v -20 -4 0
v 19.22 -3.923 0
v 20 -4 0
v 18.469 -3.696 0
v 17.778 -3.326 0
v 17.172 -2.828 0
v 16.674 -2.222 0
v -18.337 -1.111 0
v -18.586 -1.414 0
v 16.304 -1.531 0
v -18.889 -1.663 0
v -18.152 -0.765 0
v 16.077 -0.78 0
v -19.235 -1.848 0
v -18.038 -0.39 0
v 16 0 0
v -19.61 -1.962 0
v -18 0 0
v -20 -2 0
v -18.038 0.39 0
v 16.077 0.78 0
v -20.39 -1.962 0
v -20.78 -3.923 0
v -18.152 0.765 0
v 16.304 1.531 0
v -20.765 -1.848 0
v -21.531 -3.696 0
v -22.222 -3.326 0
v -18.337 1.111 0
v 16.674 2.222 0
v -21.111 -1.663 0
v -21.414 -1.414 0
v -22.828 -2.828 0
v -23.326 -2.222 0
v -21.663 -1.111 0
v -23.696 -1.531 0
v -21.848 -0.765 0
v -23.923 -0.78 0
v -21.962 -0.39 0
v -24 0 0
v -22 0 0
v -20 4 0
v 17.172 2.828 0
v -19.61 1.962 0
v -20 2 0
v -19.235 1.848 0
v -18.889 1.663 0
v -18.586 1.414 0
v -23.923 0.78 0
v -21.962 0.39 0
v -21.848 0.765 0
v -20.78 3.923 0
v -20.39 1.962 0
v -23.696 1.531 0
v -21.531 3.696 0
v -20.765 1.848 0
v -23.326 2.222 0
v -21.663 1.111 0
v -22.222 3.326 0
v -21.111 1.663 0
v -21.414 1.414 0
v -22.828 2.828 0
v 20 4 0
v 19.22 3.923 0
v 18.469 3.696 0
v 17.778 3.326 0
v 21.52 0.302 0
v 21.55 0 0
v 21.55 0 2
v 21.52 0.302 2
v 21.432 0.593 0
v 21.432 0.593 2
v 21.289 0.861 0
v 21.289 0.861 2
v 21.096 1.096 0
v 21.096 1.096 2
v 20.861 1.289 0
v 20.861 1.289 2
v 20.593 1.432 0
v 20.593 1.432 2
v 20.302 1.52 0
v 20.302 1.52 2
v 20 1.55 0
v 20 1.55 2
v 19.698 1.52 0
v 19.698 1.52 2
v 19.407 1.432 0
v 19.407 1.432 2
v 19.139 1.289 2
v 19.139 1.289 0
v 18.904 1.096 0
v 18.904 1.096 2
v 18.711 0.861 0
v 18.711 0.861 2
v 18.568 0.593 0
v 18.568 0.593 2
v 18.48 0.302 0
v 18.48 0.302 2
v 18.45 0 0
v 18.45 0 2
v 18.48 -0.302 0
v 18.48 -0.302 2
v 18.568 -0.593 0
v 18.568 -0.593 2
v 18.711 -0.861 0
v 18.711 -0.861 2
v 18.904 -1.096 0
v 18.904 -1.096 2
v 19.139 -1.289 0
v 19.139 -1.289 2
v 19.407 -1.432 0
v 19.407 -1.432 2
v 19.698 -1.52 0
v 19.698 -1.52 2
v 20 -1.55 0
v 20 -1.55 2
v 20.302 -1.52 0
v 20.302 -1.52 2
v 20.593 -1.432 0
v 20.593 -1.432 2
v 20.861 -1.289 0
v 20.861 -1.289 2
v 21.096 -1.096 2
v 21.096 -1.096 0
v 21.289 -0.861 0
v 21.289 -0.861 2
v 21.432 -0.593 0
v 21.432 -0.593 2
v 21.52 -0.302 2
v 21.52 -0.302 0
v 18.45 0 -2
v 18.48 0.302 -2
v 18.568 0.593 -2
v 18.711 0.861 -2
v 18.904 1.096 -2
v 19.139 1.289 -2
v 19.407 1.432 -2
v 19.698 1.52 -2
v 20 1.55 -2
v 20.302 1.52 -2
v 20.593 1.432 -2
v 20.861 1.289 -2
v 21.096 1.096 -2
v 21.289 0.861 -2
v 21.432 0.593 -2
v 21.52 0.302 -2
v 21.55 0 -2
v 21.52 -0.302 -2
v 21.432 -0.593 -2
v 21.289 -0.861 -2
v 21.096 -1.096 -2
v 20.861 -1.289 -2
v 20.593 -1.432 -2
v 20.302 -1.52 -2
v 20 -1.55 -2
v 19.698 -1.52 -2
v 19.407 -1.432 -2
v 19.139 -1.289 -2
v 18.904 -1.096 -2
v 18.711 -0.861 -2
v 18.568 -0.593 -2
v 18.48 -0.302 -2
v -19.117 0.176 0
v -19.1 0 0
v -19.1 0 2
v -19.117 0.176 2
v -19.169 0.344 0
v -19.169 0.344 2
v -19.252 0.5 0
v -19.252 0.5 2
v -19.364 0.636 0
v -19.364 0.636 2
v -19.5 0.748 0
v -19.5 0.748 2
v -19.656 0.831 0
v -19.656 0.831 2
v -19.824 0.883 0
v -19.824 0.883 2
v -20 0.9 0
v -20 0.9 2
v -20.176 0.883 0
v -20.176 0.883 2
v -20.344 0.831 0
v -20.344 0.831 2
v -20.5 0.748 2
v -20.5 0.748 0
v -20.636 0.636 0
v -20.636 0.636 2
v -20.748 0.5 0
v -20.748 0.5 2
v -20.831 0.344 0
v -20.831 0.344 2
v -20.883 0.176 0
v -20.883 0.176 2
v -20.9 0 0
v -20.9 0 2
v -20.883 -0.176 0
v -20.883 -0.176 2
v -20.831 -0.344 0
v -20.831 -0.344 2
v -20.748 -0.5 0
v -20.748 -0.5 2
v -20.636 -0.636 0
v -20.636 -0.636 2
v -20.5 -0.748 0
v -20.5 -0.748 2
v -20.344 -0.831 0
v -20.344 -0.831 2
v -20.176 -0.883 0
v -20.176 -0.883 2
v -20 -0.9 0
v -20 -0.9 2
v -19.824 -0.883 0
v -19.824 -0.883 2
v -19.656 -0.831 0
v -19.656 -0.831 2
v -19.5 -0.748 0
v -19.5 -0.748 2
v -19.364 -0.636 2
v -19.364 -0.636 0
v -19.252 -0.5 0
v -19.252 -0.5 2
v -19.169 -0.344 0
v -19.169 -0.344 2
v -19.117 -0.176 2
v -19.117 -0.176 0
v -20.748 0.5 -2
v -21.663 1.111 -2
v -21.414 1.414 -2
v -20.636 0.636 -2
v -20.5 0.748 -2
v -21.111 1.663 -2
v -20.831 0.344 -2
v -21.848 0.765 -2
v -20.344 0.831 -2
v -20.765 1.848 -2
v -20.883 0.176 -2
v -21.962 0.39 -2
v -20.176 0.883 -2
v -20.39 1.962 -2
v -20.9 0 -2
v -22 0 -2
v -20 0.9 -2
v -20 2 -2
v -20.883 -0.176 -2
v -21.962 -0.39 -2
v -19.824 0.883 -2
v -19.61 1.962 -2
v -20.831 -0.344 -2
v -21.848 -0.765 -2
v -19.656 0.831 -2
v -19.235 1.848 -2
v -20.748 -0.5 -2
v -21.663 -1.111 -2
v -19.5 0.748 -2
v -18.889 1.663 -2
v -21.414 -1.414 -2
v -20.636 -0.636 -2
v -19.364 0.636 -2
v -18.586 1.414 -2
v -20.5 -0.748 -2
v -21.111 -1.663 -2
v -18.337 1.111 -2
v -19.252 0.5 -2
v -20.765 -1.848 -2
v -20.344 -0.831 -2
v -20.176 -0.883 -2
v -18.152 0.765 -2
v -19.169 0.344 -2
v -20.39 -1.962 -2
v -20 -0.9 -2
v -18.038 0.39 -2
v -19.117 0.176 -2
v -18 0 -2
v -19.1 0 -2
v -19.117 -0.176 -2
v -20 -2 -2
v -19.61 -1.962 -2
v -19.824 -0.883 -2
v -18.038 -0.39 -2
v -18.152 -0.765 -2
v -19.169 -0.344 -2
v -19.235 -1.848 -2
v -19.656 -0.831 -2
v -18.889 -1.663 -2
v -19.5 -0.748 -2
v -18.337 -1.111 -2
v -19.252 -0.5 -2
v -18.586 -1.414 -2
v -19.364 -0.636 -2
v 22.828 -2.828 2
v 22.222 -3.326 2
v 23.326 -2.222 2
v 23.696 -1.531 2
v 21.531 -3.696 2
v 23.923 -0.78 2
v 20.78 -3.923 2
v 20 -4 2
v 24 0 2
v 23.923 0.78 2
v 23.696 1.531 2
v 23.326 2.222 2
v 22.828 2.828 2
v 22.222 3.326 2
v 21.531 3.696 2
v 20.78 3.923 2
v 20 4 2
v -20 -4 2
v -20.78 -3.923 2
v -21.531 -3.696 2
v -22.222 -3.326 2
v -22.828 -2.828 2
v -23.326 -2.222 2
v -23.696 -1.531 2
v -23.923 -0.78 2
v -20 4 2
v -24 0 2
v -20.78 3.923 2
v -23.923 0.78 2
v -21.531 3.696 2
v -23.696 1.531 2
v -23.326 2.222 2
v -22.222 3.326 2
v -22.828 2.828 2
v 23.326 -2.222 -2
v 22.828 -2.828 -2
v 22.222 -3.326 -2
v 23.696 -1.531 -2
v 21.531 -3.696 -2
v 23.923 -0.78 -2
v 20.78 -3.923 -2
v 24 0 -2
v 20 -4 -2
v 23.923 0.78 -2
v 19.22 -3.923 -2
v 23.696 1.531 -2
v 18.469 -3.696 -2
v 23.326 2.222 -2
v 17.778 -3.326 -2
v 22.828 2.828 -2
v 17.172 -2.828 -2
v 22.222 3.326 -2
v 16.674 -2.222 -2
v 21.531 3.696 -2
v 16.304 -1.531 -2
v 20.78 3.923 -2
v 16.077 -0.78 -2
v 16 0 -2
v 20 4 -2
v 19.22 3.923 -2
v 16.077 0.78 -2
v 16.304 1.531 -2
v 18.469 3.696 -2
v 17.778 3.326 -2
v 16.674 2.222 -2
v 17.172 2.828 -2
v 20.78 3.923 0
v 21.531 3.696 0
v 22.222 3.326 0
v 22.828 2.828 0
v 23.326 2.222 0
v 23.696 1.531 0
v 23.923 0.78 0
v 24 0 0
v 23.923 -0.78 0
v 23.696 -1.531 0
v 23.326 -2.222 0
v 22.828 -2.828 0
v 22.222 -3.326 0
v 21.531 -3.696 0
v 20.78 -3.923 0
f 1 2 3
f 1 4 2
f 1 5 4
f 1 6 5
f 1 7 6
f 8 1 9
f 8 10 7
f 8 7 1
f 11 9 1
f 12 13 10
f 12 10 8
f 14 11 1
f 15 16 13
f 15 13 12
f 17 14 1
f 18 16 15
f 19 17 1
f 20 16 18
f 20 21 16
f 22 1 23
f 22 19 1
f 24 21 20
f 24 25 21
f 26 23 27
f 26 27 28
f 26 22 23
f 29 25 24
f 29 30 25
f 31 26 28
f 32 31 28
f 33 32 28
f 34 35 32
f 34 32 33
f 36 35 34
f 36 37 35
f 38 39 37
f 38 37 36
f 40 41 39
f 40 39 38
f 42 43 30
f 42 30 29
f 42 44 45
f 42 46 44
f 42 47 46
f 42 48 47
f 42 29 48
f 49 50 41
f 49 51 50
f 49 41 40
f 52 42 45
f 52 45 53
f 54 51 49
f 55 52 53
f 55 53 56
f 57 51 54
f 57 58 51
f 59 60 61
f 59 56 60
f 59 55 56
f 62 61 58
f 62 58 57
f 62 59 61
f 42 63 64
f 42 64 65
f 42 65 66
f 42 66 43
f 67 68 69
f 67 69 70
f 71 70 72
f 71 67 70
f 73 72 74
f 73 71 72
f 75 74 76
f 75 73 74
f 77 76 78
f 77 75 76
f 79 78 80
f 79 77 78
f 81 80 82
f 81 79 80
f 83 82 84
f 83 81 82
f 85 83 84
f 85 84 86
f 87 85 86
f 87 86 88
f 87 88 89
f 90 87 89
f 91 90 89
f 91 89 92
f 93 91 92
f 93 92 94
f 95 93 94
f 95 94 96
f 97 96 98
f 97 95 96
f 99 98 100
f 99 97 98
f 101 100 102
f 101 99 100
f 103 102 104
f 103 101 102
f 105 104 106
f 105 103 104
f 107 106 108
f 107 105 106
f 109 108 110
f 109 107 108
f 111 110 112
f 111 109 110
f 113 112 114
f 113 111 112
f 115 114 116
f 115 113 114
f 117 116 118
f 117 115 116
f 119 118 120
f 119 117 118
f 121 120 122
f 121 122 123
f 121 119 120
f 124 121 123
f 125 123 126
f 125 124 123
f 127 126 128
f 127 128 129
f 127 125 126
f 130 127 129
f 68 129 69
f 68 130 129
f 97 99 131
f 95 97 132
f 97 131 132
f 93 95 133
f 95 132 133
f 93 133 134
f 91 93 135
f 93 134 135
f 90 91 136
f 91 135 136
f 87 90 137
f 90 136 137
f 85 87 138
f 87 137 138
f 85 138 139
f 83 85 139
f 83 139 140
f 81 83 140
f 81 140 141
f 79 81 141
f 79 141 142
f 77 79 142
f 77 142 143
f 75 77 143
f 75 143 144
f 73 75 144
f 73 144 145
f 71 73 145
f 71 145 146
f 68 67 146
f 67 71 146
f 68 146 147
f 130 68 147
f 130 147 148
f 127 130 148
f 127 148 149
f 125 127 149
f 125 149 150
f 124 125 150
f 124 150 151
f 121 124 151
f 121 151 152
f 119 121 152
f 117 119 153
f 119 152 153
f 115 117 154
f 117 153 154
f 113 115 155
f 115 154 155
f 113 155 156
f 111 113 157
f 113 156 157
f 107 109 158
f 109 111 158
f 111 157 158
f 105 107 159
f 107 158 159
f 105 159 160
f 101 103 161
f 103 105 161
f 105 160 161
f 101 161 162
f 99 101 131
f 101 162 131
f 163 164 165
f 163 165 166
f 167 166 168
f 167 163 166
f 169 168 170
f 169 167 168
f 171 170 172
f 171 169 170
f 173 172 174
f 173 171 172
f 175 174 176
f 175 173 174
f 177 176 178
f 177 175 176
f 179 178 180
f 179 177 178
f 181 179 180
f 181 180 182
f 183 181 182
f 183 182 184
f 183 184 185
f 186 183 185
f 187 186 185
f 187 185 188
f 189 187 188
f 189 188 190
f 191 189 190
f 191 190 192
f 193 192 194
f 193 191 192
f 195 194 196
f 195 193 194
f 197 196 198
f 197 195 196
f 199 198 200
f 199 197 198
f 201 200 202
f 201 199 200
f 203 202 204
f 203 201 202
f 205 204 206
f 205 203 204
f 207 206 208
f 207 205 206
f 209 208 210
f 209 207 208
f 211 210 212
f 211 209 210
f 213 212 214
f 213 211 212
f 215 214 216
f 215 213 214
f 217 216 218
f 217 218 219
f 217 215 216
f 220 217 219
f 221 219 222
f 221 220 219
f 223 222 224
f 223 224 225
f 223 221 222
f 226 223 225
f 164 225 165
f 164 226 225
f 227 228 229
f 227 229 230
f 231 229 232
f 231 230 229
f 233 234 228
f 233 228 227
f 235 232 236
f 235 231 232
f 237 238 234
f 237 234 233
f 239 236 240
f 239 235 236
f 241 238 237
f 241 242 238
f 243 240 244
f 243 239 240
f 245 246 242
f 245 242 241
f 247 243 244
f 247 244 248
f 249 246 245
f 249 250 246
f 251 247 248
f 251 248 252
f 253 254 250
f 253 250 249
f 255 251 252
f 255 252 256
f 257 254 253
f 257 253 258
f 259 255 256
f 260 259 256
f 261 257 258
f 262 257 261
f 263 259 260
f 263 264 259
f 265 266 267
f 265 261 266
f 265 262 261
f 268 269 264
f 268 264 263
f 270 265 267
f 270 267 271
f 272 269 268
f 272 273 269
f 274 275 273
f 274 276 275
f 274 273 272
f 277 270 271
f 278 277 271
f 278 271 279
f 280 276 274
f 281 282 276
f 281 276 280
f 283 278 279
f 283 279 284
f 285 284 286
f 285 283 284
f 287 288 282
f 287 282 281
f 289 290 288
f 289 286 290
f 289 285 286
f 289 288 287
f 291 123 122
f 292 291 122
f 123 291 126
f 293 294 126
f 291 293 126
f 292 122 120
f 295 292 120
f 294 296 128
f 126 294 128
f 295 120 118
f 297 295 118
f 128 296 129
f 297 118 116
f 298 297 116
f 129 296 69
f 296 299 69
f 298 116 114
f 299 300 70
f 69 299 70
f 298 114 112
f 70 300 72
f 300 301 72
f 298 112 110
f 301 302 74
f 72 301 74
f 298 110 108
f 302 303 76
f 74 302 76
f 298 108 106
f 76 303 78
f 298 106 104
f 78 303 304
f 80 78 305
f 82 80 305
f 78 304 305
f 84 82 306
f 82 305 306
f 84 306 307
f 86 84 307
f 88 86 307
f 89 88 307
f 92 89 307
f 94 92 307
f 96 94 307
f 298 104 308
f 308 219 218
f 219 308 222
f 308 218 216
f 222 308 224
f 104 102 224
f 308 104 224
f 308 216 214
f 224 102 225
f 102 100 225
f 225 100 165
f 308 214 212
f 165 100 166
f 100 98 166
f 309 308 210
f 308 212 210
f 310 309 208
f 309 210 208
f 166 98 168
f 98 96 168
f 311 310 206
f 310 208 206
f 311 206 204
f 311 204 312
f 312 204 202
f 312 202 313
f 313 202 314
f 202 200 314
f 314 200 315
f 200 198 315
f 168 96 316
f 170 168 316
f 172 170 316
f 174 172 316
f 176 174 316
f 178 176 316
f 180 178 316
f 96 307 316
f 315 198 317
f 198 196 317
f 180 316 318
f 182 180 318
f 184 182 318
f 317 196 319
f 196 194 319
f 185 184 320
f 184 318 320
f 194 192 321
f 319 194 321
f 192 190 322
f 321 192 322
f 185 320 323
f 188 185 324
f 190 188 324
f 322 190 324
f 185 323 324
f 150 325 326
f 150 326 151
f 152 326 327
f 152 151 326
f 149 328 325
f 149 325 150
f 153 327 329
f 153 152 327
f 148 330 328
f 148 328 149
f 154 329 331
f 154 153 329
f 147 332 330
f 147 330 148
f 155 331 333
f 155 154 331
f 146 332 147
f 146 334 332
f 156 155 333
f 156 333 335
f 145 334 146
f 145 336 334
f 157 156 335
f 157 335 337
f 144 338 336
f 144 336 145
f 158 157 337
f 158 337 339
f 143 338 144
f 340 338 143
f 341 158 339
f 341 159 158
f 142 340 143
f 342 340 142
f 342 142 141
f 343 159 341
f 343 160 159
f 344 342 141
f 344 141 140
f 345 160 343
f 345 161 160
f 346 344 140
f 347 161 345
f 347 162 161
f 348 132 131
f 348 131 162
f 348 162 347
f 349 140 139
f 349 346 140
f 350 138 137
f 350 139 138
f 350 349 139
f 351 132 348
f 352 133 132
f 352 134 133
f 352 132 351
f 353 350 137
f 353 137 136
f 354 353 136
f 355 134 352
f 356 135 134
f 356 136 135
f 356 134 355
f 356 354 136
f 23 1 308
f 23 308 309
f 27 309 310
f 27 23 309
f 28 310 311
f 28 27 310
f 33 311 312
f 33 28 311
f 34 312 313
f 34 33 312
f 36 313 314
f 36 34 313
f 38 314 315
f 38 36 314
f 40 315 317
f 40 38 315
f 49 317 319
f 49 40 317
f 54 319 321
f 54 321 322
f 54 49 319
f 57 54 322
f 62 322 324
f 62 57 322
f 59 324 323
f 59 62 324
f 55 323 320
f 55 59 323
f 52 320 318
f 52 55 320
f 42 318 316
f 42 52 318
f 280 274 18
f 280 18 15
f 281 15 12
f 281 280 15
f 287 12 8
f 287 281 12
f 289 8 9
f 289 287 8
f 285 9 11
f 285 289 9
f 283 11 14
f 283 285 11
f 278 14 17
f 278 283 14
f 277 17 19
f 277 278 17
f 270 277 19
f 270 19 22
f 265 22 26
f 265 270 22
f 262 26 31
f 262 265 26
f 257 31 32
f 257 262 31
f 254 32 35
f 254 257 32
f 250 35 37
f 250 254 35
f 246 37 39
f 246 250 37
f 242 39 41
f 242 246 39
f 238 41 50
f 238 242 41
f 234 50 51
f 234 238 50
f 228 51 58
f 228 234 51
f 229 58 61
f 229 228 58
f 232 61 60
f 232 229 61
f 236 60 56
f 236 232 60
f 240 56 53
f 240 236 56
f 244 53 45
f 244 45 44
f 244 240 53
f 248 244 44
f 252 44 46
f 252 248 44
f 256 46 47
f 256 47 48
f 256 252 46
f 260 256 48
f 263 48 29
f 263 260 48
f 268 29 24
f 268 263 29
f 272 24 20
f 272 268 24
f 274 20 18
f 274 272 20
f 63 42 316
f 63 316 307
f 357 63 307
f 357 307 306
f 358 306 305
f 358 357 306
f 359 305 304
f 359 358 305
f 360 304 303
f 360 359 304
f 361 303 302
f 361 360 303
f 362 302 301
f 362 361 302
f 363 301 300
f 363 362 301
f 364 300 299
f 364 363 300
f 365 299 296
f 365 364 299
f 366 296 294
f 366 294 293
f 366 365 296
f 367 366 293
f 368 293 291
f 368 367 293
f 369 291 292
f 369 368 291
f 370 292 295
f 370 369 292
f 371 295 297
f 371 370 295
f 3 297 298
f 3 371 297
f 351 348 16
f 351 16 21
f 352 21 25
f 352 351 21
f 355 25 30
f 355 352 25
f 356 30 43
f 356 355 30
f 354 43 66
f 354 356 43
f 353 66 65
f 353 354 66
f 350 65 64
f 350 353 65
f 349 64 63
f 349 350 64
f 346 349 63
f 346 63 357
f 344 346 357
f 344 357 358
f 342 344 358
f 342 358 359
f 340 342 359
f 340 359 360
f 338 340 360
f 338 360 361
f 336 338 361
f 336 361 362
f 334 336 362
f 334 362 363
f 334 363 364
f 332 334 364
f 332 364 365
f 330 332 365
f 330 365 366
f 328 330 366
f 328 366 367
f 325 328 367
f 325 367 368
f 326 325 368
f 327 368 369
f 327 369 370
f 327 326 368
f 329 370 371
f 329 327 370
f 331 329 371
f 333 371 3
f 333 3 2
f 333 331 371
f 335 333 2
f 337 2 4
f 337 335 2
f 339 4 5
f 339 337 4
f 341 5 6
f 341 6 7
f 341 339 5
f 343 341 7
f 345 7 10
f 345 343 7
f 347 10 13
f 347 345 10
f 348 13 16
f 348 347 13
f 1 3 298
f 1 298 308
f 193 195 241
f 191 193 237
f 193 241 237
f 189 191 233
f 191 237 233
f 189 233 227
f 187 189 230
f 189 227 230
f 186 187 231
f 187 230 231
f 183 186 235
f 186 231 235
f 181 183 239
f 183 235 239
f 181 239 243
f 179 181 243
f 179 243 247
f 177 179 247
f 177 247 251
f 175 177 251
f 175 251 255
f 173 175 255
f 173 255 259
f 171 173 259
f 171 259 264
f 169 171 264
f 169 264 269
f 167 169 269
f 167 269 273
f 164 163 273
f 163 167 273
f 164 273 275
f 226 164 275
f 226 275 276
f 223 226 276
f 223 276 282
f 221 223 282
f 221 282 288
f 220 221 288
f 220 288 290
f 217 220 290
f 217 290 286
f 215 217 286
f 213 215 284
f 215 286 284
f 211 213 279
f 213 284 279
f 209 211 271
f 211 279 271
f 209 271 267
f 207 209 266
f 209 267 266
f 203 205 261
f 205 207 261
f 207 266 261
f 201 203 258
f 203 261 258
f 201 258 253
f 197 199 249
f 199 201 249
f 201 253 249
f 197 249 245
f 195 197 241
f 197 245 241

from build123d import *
from build123d.topology import SkipClean

# Parameters (mm, degrees)
SKETCH_1_R      = 1.55
SKETCH_1_R_2    = 0.9
EXTRUDE_1_DEPTH = 2
EXTRUDE_START   = 2
SKETCH_2_R      = 2
SKETCH_2_R_2    = 0.9
EXTRUDE_2_DEPTH = 2
SKETCH_3_R      = 4
SKETCH_3_R_2    = 1.55
EXTRUDE_3_DEPTH = 2


with BuildPart() as part:
    # 草图1 → 凸台-拉伸1 (new body)
    with BuildSketch(Plane.XY):
        with BuildLine():
            Line((20, -4), (-20, -4))
            ThreePointArc((-20, -4), (-24, 0), (-20, 4))
            Line((-20, 4), (20, 4))
            ThreePointArc((20, 4), (24, 0), (20, -4))
        make_face()
        with Locations((20, 0)):
            Circle(SKETCH_1_R, mode=Mode.SUBTRACT)
        with Locations((-20, 0)):
            Circle(SKETCH_1_R_2, mode=Mode.SUBTRACT)
    extrude(amount=EXTRUDE_1_DEPTH)

    # 草图2 → 凸台-拉伸2 (add)
    with SkipClean():  # the faces are left unmerged after this step: merging them gives an invalid solid
        with BuildSketch(Plane(origin=(0, 0, 0), x_dir=(-1, 0, 0), z_dir=(0, 0, -1)).offset(EXTRUDE_START)):
            with Locations(Location((20, 0, 0), (0, 0, 180))):
                Circle(SKETCH_2_R)
            with Locations((20, 0)):
                Circle(SKETCH_2_R_2, mode=Mode.SUBTRACT)
        extrude(amount=-EXTRUDE_2_DEPTH)

    # 草图3 → 凸台-拉伸3 (add)
    with SkipClean():  # the faces are left unmerged after this step: merging them gives an invalid solid
        with BuildSketch(Plane(origin=(0, 0, 0), x_dir=(-1, 0, 0), z_dir=(0, 0, -1)).offset(EXTRUDE_START)):
            with Locations((-20, 0)):
                Circle(SKETCH_3_R)
            with Locations((-20, 0)):
                Circle(SKETCH_3_R_2, mode=Mode.SUBTRACT)
        extrude(amount=-EXTRUDE_3_DEPTH)


solid = part.part
